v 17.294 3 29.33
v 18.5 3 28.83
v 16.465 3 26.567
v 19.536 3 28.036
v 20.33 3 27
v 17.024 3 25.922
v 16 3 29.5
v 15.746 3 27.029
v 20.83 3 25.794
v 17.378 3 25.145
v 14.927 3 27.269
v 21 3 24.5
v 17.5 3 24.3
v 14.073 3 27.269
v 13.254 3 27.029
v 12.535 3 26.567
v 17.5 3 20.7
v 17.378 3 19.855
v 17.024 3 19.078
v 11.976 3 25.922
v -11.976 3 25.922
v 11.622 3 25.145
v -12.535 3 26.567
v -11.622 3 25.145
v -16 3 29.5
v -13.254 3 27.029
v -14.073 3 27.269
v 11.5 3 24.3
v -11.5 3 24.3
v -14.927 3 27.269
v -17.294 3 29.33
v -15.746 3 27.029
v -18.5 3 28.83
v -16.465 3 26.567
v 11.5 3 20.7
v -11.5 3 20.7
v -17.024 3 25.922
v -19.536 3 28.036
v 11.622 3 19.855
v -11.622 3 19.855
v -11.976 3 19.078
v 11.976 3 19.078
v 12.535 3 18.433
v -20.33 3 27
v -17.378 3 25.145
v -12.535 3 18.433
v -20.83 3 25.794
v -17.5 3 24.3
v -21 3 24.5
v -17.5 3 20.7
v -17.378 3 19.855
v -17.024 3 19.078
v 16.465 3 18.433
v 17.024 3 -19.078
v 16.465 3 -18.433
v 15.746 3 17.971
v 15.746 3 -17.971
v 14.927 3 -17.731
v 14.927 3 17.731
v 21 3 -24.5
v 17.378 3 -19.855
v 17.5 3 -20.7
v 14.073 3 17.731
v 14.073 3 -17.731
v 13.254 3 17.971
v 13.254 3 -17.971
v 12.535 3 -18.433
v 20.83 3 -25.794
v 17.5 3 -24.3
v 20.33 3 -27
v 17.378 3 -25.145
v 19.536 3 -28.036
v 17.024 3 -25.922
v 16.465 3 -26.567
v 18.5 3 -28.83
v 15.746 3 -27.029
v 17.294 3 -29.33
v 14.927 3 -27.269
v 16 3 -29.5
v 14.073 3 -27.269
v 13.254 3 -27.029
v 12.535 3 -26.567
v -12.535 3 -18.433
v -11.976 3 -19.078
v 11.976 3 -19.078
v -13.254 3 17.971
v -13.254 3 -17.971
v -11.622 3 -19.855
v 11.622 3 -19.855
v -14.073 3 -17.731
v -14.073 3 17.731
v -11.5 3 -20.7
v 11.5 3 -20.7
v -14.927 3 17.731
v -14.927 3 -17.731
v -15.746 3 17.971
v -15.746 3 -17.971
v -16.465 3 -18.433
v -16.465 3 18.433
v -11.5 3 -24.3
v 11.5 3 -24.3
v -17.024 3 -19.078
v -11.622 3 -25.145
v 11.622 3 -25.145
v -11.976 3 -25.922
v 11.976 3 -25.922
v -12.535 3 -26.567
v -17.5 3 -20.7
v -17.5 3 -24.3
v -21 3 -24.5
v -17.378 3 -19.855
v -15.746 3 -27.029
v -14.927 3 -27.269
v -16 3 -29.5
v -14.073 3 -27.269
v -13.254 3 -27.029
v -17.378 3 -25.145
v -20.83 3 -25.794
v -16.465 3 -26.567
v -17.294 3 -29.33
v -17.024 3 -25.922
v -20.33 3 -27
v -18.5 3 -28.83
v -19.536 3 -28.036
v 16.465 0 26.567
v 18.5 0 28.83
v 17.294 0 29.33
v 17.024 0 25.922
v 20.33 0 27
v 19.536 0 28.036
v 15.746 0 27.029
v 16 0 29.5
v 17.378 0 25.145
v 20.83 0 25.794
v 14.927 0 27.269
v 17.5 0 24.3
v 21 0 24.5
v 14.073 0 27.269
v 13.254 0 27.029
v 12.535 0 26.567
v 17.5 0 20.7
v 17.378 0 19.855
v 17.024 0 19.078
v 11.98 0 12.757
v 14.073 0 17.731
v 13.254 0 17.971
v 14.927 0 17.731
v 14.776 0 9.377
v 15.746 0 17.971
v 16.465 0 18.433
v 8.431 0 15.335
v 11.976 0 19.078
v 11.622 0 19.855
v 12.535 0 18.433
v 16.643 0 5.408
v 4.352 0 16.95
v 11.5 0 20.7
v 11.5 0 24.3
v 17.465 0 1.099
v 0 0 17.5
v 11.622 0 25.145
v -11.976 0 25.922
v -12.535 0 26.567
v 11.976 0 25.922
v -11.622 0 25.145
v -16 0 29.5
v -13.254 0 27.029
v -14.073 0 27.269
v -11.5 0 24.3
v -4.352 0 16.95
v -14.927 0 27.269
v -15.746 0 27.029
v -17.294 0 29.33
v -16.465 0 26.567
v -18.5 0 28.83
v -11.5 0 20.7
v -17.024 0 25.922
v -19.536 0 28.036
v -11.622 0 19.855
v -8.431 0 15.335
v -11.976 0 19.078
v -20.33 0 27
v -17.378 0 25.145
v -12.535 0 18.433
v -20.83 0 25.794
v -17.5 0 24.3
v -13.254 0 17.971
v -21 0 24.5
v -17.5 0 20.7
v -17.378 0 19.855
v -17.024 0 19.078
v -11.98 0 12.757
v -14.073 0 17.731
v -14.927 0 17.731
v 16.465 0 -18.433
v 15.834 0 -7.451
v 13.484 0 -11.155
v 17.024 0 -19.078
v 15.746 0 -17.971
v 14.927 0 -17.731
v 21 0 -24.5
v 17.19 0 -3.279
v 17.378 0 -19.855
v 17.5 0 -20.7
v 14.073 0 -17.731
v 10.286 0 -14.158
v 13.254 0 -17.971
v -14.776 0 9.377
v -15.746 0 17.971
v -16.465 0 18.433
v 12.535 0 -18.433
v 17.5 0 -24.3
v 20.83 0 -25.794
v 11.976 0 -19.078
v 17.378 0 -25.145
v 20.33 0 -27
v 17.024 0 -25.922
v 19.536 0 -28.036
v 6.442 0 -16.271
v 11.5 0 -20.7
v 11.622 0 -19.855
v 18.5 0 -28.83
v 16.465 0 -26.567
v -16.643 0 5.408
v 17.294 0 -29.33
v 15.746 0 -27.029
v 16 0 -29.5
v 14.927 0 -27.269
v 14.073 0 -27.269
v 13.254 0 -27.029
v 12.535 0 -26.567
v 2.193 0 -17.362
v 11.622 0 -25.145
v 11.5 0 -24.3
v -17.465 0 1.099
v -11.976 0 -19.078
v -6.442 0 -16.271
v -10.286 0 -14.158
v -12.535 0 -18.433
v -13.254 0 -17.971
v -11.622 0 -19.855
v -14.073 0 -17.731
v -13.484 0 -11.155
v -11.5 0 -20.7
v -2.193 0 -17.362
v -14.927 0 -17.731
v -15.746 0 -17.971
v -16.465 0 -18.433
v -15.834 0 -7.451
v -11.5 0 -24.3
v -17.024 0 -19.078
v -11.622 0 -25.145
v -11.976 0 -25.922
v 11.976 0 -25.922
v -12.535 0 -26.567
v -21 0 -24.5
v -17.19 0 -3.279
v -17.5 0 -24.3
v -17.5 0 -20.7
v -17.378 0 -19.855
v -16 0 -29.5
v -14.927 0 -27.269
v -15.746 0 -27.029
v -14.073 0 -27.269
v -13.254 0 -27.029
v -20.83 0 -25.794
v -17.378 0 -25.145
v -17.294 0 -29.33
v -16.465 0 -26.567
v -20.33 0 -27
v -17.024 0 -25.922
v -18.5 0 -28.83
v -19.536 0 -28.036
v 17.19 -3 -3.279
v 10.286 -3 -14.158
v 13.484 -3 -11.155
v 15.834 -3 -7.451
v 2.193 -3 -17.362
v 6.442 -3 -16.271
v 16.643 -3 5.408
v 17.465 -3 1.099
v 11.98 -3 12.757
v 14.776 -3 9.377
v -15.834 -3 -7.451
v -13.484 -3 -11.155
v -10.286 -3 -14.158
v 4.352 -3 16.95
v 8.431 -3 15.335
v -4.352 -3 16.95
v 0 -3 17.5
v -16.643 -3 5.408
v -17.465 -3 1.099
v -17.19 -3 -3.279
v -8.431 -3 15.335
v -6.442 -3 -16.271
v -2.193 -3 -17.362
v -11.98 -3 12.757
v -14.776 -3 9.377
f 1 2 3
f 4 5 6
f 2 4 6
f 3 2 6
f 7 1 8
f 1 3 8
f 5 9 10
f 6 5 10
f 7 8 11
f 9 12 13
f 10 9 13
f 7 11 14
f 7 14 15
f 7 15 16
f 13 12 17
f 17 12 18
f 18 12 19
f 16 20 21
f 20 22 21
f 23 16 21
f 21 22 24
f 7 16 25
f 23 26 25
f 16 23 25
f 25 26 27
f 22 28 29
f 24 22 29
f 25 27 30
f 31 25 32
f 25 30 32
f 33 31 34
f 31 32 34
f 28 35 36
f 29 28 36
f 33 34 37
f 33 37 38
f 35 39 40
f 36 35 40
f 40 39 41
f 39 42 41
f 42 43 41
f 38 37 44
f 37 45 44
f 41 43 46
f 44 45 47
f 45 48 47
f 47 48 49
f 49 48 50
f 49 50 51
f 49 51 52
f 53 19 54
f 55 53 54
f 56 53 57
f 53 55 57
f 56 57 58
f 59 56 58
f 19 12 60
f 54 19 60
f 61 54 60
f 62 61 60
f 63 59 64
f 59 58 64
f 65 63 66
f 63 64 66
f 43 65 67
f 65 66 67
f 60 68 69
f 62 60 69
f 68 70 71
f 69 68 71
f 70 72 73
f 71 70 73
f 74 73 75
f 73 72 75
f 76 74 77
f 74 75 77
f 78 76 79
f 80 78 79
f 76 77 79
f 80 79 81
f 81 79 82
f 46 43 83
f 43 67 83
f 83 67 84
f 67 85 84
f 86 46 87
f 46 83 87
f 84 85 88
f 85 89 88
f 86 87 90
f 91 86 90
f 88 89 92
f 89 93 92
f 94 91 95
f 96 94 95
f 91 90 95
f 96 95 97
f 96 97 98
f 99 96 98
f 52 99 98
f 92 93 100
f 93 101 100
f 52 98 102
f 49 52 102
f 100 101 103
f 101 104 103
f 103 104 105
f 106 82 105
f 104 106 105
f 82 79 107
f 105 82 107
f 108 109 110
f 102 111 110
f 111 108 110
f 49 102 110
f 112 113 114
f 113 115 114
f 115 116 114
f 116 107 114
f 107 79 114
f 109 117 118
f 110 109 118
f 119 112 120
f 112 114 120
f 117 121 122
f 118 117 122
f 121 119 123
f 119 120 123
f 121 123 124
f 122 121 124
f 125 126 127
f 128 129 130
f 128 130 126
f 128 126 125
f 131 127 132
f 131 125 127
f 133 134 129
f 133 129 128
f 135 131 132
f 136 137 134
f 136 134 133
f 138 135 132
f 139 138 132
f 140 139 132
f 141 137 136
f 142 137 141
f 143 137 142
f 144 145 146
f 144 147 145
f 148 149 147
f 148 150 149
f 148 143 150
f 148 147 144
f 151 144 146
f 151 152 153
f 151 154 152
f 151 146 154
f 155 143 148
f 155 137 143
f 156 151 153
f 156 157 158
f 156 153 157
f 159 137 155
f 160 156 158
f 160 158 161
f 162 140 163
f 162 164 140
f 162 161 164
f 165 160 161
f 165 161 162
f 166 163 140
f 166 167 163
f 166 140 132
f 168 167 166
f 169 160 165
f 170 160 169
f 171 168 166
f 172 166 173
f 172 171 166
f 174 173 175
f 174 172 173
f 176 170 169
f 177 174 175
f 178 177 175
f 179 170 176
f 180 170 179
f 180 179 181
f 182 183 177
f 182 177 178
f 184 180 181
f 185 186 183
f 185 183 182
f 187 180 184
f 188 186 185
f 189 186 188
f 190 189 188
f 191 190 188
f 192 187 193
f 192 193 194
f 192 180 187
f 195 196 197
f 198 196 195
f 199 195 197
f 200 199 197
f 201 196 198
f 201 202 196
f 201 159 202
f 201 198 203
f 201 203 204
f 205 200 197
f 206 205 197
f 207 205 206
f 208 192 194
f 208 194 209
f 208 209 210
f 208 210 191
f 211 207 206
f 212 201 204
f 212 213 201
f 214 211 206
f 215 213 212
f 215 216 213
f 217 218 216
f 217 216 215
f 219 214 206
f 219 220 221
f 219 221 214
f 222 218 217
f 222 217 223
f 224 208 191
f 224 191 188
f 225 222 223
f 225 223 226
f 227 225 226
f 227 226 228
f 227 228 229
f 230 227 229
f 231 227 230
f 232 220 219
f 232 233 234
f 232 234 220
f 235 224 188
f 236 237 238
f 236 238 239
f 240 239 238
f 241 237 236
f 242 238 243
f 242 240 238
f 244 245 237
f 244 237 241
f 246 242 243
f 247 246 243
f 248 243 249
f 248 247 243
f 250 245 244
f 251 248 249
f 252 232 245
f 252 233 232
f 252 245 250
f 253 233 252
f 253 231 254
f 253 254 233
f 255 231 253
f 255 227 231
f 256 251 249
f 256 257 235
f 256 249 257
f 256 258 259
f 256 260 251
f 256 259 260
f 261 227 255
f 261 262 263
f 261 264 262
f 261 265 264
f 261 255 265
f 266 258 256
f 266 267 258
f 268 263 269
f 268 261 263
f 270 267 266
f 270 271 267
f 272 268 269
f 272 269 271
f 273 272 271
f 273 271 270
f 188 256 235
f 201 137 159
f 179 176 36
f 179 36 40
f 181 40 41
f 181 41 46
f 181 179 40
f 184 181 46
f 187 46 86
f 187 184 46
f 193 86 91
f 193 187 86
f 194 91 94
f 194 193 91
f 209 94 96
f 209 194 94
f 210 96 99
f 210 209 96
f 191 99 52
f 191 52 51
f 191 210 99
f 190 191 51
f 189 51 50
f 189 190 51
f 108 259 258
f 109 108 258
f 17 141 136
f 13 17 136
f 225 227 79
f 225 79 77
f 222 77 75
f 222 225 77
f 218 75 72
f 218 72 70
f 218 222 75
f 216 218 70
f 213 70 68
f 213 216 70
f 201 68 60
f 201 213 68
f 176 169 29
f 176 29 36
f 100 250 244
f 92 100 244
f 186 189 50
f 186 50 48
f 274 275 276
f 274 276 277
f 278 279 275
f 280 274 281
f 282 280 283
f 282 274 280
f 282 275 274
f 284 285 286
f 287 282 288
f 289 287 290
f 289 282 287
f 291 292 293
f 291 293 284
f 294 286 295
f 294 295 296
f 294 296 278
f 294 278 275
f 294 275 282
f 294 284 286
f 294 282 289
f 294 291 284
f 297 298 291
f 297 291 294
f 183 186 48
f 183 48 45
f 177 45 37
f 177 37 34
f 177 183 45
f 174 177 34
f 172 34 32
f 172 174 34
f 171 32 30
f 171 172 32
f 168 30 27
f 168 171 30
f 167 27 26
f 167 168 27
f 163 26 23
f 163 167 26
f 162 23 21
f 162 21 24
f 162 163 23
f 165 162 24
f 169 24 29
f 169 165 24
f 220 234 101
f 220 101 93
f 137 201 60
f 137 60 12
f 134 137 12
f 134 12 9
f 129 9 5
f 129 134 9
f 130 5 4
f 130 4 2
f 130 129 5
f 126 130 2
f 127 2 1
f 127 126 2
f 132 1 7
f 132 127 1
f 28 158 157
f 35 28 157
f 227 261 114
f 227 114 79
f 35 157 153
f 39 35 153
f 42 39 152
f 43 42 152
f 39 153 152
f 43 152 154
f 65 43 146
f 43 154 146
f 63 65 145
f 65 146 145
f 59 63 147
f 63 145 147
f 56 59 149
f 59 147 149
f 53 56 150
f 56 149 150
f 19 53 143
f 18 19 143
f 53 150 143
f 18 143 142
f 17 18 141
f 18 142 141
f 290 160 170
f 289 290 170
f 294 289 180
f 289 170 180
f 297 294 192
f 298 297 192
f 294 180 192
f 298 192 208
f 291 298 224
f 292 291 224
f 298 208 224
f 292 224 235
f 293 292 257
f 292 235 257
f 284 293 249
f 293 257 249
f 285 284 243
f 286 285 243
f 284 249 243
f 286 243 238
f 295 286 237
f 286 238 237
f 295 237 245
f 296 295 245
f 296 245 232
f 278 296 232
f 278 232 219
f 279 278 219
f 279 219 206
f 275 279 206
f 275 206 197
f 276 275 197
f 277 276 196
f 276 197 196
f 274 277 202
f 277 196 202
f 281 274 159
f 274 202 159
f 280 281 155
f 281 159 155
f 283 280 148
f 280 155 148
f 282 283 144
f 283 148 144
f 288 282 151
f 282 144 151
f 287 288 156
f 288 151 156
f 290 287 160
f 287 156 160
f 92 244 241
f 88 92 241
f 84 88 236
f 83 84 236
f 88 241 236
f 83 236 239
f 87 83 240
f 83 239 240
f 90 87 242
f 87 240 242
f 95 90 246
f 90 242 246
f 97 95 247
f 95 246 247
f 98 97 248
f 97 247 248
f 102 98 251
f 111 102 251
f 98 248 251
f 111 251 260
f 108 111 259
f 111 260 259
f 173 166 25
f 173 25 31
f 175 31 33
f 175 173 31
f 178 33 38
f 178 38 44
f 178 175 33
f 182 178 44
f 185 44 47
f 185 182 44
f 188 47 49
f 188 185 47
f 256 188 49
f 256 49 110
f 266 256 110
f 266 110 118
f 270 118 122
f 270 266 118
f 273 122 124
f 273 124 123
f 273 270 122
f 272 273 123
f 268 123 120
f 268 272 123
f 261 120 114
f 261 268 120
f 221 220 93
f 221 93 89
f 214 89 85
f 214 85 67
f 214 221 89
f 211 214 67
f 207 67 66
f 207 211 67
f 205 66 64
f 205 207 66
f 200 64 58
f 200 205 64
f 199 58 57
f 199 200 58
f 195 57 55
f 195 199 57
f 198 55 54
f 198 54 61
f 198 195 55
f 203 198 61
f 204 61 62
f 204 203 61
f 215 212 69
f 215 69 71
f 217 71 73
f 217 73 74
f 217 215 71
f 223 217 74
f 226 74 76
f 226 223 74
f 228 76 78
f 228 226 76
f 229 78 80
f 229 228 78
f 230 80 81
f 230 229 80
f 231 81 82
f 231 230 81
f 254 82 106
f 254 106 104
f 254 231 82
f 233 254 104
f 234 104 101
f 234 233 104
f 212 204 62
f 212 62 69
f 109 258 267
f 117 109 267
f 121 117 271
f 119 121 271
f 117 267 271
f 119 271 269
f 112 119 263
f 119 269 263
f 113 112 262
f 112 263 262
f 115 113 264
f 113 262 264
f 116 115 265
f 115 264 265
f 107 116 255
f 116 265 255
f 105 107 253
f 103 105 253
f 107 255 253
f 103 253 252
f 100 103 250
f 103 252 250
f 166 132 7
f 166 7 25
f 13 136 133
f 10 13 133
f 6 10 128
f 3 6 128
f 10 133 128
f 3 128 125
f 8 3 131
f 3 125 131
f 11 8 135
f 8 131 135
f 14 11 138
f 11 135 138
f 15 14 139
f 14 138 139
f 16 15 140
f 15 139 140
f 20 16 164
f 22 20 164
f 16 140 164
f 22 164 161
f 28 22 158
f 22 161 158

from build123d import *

# Parameters (mm, degrees)
EXTRUDE_1_DEPTH = 3
SKETCH_2_R      = 17.5
EXTRUDE_2_DEPTH = 3


with BuildPart() as part:
    # 草图1 → 凸台-拉伸1 (new body)
    with BuildSketch(Plane(origin=(0, 0, 0), x_dir=(1, 0, 0), z_dir=(0, 1, 0))):
        with BuildLine():
            Line((16, -29.5), (-16, -29.5))
            ThreePointArc((-16, -29.5), (-19.535533906, -28.035533906), (-21, -24.5))
            Line((-21, -24.5), (-21, 24.5))
            ThreePointArc((-21, 24.5), (-19.535533906, 28.035533906), (-16, 29.5))
            Line((-16, 29.5), (16, 29.5))
            ThreePointArc((16, 29.5), (19.535533906, 28.035533906), (21, 24.5))
            Line((21, 24.5), (21, -24.5))
            ThreePointArc((21, -24.5), (19.535533906, -28.035533906), (16, -29.5))
        make_face()
        with BuildLine():
            Line((-11.5, 24.3), (-11.5, 20.7))
            ThreePointArc((-11.5, 20.7), (-14.5, 17.7), (-17.5, 20.7))
            Line((-17.5, 20.7), (-17.5, 24.3))
            ThreePointArc((-17.5, 24.3), (-14.5, 27.3), (-11.5, 24.3))
        make_face(mode=Mode.SUBTRACT)
        with BuildLine():
            Line((11.5, 24.3), (11.5, 20.7))
            ThreePointArc((11.5, 20.7), (14.5, 17.7), (17.5, 20.7))
            Line((17.5, 20.7), (17.5, 24.3))
            ThreePointArc((17.5, 24.3), (14.5, 27.3), (11.5, 24.3))
        make_face(mode=Mode.SUBTRACT)
        with BuildLine():
            Line((-11.5, -24.3), (-11.5, -20.7))
            ThreePointArc((-11.5, -20.7), (-14.5, -17.7), (-17.5, -20.7))
            Line((-17.5, -20.7), (-17.5, -24.3))
            ThreePointArc((-17.5, -24.3), (-14.5, -27.3), (-11.5, -24.3))
        make_face(mode=Mode.SUBTRACT)
        with BuildLine():
            Line((11.5, -24.3), (11.5, -20.7))
            ThreePointArc((11.5, -20.7), (14.5, -17.7), (17.5, -20.7))
            Line((17.5, -20.7), (17.5, -24.3))
            ThreePointArc((17.5, -24.3), (14.5, -27.3), (11.5, -24.3))
        make_face(mode=Mode.SUBTRACT)
    extrude(amount=EXTRUDE_1_DEPTH)

    # 草图2 → 凸台-拉伸2 (add)
    with BuildSketch(Plane.XZ):
        with Locations(Location((0, 0, 0), (0, 0, 90))):
            Circle(SKETCH_2_R)
    extrude(amount=EXTRUDE_2_DEPTH)


solid = part.part
